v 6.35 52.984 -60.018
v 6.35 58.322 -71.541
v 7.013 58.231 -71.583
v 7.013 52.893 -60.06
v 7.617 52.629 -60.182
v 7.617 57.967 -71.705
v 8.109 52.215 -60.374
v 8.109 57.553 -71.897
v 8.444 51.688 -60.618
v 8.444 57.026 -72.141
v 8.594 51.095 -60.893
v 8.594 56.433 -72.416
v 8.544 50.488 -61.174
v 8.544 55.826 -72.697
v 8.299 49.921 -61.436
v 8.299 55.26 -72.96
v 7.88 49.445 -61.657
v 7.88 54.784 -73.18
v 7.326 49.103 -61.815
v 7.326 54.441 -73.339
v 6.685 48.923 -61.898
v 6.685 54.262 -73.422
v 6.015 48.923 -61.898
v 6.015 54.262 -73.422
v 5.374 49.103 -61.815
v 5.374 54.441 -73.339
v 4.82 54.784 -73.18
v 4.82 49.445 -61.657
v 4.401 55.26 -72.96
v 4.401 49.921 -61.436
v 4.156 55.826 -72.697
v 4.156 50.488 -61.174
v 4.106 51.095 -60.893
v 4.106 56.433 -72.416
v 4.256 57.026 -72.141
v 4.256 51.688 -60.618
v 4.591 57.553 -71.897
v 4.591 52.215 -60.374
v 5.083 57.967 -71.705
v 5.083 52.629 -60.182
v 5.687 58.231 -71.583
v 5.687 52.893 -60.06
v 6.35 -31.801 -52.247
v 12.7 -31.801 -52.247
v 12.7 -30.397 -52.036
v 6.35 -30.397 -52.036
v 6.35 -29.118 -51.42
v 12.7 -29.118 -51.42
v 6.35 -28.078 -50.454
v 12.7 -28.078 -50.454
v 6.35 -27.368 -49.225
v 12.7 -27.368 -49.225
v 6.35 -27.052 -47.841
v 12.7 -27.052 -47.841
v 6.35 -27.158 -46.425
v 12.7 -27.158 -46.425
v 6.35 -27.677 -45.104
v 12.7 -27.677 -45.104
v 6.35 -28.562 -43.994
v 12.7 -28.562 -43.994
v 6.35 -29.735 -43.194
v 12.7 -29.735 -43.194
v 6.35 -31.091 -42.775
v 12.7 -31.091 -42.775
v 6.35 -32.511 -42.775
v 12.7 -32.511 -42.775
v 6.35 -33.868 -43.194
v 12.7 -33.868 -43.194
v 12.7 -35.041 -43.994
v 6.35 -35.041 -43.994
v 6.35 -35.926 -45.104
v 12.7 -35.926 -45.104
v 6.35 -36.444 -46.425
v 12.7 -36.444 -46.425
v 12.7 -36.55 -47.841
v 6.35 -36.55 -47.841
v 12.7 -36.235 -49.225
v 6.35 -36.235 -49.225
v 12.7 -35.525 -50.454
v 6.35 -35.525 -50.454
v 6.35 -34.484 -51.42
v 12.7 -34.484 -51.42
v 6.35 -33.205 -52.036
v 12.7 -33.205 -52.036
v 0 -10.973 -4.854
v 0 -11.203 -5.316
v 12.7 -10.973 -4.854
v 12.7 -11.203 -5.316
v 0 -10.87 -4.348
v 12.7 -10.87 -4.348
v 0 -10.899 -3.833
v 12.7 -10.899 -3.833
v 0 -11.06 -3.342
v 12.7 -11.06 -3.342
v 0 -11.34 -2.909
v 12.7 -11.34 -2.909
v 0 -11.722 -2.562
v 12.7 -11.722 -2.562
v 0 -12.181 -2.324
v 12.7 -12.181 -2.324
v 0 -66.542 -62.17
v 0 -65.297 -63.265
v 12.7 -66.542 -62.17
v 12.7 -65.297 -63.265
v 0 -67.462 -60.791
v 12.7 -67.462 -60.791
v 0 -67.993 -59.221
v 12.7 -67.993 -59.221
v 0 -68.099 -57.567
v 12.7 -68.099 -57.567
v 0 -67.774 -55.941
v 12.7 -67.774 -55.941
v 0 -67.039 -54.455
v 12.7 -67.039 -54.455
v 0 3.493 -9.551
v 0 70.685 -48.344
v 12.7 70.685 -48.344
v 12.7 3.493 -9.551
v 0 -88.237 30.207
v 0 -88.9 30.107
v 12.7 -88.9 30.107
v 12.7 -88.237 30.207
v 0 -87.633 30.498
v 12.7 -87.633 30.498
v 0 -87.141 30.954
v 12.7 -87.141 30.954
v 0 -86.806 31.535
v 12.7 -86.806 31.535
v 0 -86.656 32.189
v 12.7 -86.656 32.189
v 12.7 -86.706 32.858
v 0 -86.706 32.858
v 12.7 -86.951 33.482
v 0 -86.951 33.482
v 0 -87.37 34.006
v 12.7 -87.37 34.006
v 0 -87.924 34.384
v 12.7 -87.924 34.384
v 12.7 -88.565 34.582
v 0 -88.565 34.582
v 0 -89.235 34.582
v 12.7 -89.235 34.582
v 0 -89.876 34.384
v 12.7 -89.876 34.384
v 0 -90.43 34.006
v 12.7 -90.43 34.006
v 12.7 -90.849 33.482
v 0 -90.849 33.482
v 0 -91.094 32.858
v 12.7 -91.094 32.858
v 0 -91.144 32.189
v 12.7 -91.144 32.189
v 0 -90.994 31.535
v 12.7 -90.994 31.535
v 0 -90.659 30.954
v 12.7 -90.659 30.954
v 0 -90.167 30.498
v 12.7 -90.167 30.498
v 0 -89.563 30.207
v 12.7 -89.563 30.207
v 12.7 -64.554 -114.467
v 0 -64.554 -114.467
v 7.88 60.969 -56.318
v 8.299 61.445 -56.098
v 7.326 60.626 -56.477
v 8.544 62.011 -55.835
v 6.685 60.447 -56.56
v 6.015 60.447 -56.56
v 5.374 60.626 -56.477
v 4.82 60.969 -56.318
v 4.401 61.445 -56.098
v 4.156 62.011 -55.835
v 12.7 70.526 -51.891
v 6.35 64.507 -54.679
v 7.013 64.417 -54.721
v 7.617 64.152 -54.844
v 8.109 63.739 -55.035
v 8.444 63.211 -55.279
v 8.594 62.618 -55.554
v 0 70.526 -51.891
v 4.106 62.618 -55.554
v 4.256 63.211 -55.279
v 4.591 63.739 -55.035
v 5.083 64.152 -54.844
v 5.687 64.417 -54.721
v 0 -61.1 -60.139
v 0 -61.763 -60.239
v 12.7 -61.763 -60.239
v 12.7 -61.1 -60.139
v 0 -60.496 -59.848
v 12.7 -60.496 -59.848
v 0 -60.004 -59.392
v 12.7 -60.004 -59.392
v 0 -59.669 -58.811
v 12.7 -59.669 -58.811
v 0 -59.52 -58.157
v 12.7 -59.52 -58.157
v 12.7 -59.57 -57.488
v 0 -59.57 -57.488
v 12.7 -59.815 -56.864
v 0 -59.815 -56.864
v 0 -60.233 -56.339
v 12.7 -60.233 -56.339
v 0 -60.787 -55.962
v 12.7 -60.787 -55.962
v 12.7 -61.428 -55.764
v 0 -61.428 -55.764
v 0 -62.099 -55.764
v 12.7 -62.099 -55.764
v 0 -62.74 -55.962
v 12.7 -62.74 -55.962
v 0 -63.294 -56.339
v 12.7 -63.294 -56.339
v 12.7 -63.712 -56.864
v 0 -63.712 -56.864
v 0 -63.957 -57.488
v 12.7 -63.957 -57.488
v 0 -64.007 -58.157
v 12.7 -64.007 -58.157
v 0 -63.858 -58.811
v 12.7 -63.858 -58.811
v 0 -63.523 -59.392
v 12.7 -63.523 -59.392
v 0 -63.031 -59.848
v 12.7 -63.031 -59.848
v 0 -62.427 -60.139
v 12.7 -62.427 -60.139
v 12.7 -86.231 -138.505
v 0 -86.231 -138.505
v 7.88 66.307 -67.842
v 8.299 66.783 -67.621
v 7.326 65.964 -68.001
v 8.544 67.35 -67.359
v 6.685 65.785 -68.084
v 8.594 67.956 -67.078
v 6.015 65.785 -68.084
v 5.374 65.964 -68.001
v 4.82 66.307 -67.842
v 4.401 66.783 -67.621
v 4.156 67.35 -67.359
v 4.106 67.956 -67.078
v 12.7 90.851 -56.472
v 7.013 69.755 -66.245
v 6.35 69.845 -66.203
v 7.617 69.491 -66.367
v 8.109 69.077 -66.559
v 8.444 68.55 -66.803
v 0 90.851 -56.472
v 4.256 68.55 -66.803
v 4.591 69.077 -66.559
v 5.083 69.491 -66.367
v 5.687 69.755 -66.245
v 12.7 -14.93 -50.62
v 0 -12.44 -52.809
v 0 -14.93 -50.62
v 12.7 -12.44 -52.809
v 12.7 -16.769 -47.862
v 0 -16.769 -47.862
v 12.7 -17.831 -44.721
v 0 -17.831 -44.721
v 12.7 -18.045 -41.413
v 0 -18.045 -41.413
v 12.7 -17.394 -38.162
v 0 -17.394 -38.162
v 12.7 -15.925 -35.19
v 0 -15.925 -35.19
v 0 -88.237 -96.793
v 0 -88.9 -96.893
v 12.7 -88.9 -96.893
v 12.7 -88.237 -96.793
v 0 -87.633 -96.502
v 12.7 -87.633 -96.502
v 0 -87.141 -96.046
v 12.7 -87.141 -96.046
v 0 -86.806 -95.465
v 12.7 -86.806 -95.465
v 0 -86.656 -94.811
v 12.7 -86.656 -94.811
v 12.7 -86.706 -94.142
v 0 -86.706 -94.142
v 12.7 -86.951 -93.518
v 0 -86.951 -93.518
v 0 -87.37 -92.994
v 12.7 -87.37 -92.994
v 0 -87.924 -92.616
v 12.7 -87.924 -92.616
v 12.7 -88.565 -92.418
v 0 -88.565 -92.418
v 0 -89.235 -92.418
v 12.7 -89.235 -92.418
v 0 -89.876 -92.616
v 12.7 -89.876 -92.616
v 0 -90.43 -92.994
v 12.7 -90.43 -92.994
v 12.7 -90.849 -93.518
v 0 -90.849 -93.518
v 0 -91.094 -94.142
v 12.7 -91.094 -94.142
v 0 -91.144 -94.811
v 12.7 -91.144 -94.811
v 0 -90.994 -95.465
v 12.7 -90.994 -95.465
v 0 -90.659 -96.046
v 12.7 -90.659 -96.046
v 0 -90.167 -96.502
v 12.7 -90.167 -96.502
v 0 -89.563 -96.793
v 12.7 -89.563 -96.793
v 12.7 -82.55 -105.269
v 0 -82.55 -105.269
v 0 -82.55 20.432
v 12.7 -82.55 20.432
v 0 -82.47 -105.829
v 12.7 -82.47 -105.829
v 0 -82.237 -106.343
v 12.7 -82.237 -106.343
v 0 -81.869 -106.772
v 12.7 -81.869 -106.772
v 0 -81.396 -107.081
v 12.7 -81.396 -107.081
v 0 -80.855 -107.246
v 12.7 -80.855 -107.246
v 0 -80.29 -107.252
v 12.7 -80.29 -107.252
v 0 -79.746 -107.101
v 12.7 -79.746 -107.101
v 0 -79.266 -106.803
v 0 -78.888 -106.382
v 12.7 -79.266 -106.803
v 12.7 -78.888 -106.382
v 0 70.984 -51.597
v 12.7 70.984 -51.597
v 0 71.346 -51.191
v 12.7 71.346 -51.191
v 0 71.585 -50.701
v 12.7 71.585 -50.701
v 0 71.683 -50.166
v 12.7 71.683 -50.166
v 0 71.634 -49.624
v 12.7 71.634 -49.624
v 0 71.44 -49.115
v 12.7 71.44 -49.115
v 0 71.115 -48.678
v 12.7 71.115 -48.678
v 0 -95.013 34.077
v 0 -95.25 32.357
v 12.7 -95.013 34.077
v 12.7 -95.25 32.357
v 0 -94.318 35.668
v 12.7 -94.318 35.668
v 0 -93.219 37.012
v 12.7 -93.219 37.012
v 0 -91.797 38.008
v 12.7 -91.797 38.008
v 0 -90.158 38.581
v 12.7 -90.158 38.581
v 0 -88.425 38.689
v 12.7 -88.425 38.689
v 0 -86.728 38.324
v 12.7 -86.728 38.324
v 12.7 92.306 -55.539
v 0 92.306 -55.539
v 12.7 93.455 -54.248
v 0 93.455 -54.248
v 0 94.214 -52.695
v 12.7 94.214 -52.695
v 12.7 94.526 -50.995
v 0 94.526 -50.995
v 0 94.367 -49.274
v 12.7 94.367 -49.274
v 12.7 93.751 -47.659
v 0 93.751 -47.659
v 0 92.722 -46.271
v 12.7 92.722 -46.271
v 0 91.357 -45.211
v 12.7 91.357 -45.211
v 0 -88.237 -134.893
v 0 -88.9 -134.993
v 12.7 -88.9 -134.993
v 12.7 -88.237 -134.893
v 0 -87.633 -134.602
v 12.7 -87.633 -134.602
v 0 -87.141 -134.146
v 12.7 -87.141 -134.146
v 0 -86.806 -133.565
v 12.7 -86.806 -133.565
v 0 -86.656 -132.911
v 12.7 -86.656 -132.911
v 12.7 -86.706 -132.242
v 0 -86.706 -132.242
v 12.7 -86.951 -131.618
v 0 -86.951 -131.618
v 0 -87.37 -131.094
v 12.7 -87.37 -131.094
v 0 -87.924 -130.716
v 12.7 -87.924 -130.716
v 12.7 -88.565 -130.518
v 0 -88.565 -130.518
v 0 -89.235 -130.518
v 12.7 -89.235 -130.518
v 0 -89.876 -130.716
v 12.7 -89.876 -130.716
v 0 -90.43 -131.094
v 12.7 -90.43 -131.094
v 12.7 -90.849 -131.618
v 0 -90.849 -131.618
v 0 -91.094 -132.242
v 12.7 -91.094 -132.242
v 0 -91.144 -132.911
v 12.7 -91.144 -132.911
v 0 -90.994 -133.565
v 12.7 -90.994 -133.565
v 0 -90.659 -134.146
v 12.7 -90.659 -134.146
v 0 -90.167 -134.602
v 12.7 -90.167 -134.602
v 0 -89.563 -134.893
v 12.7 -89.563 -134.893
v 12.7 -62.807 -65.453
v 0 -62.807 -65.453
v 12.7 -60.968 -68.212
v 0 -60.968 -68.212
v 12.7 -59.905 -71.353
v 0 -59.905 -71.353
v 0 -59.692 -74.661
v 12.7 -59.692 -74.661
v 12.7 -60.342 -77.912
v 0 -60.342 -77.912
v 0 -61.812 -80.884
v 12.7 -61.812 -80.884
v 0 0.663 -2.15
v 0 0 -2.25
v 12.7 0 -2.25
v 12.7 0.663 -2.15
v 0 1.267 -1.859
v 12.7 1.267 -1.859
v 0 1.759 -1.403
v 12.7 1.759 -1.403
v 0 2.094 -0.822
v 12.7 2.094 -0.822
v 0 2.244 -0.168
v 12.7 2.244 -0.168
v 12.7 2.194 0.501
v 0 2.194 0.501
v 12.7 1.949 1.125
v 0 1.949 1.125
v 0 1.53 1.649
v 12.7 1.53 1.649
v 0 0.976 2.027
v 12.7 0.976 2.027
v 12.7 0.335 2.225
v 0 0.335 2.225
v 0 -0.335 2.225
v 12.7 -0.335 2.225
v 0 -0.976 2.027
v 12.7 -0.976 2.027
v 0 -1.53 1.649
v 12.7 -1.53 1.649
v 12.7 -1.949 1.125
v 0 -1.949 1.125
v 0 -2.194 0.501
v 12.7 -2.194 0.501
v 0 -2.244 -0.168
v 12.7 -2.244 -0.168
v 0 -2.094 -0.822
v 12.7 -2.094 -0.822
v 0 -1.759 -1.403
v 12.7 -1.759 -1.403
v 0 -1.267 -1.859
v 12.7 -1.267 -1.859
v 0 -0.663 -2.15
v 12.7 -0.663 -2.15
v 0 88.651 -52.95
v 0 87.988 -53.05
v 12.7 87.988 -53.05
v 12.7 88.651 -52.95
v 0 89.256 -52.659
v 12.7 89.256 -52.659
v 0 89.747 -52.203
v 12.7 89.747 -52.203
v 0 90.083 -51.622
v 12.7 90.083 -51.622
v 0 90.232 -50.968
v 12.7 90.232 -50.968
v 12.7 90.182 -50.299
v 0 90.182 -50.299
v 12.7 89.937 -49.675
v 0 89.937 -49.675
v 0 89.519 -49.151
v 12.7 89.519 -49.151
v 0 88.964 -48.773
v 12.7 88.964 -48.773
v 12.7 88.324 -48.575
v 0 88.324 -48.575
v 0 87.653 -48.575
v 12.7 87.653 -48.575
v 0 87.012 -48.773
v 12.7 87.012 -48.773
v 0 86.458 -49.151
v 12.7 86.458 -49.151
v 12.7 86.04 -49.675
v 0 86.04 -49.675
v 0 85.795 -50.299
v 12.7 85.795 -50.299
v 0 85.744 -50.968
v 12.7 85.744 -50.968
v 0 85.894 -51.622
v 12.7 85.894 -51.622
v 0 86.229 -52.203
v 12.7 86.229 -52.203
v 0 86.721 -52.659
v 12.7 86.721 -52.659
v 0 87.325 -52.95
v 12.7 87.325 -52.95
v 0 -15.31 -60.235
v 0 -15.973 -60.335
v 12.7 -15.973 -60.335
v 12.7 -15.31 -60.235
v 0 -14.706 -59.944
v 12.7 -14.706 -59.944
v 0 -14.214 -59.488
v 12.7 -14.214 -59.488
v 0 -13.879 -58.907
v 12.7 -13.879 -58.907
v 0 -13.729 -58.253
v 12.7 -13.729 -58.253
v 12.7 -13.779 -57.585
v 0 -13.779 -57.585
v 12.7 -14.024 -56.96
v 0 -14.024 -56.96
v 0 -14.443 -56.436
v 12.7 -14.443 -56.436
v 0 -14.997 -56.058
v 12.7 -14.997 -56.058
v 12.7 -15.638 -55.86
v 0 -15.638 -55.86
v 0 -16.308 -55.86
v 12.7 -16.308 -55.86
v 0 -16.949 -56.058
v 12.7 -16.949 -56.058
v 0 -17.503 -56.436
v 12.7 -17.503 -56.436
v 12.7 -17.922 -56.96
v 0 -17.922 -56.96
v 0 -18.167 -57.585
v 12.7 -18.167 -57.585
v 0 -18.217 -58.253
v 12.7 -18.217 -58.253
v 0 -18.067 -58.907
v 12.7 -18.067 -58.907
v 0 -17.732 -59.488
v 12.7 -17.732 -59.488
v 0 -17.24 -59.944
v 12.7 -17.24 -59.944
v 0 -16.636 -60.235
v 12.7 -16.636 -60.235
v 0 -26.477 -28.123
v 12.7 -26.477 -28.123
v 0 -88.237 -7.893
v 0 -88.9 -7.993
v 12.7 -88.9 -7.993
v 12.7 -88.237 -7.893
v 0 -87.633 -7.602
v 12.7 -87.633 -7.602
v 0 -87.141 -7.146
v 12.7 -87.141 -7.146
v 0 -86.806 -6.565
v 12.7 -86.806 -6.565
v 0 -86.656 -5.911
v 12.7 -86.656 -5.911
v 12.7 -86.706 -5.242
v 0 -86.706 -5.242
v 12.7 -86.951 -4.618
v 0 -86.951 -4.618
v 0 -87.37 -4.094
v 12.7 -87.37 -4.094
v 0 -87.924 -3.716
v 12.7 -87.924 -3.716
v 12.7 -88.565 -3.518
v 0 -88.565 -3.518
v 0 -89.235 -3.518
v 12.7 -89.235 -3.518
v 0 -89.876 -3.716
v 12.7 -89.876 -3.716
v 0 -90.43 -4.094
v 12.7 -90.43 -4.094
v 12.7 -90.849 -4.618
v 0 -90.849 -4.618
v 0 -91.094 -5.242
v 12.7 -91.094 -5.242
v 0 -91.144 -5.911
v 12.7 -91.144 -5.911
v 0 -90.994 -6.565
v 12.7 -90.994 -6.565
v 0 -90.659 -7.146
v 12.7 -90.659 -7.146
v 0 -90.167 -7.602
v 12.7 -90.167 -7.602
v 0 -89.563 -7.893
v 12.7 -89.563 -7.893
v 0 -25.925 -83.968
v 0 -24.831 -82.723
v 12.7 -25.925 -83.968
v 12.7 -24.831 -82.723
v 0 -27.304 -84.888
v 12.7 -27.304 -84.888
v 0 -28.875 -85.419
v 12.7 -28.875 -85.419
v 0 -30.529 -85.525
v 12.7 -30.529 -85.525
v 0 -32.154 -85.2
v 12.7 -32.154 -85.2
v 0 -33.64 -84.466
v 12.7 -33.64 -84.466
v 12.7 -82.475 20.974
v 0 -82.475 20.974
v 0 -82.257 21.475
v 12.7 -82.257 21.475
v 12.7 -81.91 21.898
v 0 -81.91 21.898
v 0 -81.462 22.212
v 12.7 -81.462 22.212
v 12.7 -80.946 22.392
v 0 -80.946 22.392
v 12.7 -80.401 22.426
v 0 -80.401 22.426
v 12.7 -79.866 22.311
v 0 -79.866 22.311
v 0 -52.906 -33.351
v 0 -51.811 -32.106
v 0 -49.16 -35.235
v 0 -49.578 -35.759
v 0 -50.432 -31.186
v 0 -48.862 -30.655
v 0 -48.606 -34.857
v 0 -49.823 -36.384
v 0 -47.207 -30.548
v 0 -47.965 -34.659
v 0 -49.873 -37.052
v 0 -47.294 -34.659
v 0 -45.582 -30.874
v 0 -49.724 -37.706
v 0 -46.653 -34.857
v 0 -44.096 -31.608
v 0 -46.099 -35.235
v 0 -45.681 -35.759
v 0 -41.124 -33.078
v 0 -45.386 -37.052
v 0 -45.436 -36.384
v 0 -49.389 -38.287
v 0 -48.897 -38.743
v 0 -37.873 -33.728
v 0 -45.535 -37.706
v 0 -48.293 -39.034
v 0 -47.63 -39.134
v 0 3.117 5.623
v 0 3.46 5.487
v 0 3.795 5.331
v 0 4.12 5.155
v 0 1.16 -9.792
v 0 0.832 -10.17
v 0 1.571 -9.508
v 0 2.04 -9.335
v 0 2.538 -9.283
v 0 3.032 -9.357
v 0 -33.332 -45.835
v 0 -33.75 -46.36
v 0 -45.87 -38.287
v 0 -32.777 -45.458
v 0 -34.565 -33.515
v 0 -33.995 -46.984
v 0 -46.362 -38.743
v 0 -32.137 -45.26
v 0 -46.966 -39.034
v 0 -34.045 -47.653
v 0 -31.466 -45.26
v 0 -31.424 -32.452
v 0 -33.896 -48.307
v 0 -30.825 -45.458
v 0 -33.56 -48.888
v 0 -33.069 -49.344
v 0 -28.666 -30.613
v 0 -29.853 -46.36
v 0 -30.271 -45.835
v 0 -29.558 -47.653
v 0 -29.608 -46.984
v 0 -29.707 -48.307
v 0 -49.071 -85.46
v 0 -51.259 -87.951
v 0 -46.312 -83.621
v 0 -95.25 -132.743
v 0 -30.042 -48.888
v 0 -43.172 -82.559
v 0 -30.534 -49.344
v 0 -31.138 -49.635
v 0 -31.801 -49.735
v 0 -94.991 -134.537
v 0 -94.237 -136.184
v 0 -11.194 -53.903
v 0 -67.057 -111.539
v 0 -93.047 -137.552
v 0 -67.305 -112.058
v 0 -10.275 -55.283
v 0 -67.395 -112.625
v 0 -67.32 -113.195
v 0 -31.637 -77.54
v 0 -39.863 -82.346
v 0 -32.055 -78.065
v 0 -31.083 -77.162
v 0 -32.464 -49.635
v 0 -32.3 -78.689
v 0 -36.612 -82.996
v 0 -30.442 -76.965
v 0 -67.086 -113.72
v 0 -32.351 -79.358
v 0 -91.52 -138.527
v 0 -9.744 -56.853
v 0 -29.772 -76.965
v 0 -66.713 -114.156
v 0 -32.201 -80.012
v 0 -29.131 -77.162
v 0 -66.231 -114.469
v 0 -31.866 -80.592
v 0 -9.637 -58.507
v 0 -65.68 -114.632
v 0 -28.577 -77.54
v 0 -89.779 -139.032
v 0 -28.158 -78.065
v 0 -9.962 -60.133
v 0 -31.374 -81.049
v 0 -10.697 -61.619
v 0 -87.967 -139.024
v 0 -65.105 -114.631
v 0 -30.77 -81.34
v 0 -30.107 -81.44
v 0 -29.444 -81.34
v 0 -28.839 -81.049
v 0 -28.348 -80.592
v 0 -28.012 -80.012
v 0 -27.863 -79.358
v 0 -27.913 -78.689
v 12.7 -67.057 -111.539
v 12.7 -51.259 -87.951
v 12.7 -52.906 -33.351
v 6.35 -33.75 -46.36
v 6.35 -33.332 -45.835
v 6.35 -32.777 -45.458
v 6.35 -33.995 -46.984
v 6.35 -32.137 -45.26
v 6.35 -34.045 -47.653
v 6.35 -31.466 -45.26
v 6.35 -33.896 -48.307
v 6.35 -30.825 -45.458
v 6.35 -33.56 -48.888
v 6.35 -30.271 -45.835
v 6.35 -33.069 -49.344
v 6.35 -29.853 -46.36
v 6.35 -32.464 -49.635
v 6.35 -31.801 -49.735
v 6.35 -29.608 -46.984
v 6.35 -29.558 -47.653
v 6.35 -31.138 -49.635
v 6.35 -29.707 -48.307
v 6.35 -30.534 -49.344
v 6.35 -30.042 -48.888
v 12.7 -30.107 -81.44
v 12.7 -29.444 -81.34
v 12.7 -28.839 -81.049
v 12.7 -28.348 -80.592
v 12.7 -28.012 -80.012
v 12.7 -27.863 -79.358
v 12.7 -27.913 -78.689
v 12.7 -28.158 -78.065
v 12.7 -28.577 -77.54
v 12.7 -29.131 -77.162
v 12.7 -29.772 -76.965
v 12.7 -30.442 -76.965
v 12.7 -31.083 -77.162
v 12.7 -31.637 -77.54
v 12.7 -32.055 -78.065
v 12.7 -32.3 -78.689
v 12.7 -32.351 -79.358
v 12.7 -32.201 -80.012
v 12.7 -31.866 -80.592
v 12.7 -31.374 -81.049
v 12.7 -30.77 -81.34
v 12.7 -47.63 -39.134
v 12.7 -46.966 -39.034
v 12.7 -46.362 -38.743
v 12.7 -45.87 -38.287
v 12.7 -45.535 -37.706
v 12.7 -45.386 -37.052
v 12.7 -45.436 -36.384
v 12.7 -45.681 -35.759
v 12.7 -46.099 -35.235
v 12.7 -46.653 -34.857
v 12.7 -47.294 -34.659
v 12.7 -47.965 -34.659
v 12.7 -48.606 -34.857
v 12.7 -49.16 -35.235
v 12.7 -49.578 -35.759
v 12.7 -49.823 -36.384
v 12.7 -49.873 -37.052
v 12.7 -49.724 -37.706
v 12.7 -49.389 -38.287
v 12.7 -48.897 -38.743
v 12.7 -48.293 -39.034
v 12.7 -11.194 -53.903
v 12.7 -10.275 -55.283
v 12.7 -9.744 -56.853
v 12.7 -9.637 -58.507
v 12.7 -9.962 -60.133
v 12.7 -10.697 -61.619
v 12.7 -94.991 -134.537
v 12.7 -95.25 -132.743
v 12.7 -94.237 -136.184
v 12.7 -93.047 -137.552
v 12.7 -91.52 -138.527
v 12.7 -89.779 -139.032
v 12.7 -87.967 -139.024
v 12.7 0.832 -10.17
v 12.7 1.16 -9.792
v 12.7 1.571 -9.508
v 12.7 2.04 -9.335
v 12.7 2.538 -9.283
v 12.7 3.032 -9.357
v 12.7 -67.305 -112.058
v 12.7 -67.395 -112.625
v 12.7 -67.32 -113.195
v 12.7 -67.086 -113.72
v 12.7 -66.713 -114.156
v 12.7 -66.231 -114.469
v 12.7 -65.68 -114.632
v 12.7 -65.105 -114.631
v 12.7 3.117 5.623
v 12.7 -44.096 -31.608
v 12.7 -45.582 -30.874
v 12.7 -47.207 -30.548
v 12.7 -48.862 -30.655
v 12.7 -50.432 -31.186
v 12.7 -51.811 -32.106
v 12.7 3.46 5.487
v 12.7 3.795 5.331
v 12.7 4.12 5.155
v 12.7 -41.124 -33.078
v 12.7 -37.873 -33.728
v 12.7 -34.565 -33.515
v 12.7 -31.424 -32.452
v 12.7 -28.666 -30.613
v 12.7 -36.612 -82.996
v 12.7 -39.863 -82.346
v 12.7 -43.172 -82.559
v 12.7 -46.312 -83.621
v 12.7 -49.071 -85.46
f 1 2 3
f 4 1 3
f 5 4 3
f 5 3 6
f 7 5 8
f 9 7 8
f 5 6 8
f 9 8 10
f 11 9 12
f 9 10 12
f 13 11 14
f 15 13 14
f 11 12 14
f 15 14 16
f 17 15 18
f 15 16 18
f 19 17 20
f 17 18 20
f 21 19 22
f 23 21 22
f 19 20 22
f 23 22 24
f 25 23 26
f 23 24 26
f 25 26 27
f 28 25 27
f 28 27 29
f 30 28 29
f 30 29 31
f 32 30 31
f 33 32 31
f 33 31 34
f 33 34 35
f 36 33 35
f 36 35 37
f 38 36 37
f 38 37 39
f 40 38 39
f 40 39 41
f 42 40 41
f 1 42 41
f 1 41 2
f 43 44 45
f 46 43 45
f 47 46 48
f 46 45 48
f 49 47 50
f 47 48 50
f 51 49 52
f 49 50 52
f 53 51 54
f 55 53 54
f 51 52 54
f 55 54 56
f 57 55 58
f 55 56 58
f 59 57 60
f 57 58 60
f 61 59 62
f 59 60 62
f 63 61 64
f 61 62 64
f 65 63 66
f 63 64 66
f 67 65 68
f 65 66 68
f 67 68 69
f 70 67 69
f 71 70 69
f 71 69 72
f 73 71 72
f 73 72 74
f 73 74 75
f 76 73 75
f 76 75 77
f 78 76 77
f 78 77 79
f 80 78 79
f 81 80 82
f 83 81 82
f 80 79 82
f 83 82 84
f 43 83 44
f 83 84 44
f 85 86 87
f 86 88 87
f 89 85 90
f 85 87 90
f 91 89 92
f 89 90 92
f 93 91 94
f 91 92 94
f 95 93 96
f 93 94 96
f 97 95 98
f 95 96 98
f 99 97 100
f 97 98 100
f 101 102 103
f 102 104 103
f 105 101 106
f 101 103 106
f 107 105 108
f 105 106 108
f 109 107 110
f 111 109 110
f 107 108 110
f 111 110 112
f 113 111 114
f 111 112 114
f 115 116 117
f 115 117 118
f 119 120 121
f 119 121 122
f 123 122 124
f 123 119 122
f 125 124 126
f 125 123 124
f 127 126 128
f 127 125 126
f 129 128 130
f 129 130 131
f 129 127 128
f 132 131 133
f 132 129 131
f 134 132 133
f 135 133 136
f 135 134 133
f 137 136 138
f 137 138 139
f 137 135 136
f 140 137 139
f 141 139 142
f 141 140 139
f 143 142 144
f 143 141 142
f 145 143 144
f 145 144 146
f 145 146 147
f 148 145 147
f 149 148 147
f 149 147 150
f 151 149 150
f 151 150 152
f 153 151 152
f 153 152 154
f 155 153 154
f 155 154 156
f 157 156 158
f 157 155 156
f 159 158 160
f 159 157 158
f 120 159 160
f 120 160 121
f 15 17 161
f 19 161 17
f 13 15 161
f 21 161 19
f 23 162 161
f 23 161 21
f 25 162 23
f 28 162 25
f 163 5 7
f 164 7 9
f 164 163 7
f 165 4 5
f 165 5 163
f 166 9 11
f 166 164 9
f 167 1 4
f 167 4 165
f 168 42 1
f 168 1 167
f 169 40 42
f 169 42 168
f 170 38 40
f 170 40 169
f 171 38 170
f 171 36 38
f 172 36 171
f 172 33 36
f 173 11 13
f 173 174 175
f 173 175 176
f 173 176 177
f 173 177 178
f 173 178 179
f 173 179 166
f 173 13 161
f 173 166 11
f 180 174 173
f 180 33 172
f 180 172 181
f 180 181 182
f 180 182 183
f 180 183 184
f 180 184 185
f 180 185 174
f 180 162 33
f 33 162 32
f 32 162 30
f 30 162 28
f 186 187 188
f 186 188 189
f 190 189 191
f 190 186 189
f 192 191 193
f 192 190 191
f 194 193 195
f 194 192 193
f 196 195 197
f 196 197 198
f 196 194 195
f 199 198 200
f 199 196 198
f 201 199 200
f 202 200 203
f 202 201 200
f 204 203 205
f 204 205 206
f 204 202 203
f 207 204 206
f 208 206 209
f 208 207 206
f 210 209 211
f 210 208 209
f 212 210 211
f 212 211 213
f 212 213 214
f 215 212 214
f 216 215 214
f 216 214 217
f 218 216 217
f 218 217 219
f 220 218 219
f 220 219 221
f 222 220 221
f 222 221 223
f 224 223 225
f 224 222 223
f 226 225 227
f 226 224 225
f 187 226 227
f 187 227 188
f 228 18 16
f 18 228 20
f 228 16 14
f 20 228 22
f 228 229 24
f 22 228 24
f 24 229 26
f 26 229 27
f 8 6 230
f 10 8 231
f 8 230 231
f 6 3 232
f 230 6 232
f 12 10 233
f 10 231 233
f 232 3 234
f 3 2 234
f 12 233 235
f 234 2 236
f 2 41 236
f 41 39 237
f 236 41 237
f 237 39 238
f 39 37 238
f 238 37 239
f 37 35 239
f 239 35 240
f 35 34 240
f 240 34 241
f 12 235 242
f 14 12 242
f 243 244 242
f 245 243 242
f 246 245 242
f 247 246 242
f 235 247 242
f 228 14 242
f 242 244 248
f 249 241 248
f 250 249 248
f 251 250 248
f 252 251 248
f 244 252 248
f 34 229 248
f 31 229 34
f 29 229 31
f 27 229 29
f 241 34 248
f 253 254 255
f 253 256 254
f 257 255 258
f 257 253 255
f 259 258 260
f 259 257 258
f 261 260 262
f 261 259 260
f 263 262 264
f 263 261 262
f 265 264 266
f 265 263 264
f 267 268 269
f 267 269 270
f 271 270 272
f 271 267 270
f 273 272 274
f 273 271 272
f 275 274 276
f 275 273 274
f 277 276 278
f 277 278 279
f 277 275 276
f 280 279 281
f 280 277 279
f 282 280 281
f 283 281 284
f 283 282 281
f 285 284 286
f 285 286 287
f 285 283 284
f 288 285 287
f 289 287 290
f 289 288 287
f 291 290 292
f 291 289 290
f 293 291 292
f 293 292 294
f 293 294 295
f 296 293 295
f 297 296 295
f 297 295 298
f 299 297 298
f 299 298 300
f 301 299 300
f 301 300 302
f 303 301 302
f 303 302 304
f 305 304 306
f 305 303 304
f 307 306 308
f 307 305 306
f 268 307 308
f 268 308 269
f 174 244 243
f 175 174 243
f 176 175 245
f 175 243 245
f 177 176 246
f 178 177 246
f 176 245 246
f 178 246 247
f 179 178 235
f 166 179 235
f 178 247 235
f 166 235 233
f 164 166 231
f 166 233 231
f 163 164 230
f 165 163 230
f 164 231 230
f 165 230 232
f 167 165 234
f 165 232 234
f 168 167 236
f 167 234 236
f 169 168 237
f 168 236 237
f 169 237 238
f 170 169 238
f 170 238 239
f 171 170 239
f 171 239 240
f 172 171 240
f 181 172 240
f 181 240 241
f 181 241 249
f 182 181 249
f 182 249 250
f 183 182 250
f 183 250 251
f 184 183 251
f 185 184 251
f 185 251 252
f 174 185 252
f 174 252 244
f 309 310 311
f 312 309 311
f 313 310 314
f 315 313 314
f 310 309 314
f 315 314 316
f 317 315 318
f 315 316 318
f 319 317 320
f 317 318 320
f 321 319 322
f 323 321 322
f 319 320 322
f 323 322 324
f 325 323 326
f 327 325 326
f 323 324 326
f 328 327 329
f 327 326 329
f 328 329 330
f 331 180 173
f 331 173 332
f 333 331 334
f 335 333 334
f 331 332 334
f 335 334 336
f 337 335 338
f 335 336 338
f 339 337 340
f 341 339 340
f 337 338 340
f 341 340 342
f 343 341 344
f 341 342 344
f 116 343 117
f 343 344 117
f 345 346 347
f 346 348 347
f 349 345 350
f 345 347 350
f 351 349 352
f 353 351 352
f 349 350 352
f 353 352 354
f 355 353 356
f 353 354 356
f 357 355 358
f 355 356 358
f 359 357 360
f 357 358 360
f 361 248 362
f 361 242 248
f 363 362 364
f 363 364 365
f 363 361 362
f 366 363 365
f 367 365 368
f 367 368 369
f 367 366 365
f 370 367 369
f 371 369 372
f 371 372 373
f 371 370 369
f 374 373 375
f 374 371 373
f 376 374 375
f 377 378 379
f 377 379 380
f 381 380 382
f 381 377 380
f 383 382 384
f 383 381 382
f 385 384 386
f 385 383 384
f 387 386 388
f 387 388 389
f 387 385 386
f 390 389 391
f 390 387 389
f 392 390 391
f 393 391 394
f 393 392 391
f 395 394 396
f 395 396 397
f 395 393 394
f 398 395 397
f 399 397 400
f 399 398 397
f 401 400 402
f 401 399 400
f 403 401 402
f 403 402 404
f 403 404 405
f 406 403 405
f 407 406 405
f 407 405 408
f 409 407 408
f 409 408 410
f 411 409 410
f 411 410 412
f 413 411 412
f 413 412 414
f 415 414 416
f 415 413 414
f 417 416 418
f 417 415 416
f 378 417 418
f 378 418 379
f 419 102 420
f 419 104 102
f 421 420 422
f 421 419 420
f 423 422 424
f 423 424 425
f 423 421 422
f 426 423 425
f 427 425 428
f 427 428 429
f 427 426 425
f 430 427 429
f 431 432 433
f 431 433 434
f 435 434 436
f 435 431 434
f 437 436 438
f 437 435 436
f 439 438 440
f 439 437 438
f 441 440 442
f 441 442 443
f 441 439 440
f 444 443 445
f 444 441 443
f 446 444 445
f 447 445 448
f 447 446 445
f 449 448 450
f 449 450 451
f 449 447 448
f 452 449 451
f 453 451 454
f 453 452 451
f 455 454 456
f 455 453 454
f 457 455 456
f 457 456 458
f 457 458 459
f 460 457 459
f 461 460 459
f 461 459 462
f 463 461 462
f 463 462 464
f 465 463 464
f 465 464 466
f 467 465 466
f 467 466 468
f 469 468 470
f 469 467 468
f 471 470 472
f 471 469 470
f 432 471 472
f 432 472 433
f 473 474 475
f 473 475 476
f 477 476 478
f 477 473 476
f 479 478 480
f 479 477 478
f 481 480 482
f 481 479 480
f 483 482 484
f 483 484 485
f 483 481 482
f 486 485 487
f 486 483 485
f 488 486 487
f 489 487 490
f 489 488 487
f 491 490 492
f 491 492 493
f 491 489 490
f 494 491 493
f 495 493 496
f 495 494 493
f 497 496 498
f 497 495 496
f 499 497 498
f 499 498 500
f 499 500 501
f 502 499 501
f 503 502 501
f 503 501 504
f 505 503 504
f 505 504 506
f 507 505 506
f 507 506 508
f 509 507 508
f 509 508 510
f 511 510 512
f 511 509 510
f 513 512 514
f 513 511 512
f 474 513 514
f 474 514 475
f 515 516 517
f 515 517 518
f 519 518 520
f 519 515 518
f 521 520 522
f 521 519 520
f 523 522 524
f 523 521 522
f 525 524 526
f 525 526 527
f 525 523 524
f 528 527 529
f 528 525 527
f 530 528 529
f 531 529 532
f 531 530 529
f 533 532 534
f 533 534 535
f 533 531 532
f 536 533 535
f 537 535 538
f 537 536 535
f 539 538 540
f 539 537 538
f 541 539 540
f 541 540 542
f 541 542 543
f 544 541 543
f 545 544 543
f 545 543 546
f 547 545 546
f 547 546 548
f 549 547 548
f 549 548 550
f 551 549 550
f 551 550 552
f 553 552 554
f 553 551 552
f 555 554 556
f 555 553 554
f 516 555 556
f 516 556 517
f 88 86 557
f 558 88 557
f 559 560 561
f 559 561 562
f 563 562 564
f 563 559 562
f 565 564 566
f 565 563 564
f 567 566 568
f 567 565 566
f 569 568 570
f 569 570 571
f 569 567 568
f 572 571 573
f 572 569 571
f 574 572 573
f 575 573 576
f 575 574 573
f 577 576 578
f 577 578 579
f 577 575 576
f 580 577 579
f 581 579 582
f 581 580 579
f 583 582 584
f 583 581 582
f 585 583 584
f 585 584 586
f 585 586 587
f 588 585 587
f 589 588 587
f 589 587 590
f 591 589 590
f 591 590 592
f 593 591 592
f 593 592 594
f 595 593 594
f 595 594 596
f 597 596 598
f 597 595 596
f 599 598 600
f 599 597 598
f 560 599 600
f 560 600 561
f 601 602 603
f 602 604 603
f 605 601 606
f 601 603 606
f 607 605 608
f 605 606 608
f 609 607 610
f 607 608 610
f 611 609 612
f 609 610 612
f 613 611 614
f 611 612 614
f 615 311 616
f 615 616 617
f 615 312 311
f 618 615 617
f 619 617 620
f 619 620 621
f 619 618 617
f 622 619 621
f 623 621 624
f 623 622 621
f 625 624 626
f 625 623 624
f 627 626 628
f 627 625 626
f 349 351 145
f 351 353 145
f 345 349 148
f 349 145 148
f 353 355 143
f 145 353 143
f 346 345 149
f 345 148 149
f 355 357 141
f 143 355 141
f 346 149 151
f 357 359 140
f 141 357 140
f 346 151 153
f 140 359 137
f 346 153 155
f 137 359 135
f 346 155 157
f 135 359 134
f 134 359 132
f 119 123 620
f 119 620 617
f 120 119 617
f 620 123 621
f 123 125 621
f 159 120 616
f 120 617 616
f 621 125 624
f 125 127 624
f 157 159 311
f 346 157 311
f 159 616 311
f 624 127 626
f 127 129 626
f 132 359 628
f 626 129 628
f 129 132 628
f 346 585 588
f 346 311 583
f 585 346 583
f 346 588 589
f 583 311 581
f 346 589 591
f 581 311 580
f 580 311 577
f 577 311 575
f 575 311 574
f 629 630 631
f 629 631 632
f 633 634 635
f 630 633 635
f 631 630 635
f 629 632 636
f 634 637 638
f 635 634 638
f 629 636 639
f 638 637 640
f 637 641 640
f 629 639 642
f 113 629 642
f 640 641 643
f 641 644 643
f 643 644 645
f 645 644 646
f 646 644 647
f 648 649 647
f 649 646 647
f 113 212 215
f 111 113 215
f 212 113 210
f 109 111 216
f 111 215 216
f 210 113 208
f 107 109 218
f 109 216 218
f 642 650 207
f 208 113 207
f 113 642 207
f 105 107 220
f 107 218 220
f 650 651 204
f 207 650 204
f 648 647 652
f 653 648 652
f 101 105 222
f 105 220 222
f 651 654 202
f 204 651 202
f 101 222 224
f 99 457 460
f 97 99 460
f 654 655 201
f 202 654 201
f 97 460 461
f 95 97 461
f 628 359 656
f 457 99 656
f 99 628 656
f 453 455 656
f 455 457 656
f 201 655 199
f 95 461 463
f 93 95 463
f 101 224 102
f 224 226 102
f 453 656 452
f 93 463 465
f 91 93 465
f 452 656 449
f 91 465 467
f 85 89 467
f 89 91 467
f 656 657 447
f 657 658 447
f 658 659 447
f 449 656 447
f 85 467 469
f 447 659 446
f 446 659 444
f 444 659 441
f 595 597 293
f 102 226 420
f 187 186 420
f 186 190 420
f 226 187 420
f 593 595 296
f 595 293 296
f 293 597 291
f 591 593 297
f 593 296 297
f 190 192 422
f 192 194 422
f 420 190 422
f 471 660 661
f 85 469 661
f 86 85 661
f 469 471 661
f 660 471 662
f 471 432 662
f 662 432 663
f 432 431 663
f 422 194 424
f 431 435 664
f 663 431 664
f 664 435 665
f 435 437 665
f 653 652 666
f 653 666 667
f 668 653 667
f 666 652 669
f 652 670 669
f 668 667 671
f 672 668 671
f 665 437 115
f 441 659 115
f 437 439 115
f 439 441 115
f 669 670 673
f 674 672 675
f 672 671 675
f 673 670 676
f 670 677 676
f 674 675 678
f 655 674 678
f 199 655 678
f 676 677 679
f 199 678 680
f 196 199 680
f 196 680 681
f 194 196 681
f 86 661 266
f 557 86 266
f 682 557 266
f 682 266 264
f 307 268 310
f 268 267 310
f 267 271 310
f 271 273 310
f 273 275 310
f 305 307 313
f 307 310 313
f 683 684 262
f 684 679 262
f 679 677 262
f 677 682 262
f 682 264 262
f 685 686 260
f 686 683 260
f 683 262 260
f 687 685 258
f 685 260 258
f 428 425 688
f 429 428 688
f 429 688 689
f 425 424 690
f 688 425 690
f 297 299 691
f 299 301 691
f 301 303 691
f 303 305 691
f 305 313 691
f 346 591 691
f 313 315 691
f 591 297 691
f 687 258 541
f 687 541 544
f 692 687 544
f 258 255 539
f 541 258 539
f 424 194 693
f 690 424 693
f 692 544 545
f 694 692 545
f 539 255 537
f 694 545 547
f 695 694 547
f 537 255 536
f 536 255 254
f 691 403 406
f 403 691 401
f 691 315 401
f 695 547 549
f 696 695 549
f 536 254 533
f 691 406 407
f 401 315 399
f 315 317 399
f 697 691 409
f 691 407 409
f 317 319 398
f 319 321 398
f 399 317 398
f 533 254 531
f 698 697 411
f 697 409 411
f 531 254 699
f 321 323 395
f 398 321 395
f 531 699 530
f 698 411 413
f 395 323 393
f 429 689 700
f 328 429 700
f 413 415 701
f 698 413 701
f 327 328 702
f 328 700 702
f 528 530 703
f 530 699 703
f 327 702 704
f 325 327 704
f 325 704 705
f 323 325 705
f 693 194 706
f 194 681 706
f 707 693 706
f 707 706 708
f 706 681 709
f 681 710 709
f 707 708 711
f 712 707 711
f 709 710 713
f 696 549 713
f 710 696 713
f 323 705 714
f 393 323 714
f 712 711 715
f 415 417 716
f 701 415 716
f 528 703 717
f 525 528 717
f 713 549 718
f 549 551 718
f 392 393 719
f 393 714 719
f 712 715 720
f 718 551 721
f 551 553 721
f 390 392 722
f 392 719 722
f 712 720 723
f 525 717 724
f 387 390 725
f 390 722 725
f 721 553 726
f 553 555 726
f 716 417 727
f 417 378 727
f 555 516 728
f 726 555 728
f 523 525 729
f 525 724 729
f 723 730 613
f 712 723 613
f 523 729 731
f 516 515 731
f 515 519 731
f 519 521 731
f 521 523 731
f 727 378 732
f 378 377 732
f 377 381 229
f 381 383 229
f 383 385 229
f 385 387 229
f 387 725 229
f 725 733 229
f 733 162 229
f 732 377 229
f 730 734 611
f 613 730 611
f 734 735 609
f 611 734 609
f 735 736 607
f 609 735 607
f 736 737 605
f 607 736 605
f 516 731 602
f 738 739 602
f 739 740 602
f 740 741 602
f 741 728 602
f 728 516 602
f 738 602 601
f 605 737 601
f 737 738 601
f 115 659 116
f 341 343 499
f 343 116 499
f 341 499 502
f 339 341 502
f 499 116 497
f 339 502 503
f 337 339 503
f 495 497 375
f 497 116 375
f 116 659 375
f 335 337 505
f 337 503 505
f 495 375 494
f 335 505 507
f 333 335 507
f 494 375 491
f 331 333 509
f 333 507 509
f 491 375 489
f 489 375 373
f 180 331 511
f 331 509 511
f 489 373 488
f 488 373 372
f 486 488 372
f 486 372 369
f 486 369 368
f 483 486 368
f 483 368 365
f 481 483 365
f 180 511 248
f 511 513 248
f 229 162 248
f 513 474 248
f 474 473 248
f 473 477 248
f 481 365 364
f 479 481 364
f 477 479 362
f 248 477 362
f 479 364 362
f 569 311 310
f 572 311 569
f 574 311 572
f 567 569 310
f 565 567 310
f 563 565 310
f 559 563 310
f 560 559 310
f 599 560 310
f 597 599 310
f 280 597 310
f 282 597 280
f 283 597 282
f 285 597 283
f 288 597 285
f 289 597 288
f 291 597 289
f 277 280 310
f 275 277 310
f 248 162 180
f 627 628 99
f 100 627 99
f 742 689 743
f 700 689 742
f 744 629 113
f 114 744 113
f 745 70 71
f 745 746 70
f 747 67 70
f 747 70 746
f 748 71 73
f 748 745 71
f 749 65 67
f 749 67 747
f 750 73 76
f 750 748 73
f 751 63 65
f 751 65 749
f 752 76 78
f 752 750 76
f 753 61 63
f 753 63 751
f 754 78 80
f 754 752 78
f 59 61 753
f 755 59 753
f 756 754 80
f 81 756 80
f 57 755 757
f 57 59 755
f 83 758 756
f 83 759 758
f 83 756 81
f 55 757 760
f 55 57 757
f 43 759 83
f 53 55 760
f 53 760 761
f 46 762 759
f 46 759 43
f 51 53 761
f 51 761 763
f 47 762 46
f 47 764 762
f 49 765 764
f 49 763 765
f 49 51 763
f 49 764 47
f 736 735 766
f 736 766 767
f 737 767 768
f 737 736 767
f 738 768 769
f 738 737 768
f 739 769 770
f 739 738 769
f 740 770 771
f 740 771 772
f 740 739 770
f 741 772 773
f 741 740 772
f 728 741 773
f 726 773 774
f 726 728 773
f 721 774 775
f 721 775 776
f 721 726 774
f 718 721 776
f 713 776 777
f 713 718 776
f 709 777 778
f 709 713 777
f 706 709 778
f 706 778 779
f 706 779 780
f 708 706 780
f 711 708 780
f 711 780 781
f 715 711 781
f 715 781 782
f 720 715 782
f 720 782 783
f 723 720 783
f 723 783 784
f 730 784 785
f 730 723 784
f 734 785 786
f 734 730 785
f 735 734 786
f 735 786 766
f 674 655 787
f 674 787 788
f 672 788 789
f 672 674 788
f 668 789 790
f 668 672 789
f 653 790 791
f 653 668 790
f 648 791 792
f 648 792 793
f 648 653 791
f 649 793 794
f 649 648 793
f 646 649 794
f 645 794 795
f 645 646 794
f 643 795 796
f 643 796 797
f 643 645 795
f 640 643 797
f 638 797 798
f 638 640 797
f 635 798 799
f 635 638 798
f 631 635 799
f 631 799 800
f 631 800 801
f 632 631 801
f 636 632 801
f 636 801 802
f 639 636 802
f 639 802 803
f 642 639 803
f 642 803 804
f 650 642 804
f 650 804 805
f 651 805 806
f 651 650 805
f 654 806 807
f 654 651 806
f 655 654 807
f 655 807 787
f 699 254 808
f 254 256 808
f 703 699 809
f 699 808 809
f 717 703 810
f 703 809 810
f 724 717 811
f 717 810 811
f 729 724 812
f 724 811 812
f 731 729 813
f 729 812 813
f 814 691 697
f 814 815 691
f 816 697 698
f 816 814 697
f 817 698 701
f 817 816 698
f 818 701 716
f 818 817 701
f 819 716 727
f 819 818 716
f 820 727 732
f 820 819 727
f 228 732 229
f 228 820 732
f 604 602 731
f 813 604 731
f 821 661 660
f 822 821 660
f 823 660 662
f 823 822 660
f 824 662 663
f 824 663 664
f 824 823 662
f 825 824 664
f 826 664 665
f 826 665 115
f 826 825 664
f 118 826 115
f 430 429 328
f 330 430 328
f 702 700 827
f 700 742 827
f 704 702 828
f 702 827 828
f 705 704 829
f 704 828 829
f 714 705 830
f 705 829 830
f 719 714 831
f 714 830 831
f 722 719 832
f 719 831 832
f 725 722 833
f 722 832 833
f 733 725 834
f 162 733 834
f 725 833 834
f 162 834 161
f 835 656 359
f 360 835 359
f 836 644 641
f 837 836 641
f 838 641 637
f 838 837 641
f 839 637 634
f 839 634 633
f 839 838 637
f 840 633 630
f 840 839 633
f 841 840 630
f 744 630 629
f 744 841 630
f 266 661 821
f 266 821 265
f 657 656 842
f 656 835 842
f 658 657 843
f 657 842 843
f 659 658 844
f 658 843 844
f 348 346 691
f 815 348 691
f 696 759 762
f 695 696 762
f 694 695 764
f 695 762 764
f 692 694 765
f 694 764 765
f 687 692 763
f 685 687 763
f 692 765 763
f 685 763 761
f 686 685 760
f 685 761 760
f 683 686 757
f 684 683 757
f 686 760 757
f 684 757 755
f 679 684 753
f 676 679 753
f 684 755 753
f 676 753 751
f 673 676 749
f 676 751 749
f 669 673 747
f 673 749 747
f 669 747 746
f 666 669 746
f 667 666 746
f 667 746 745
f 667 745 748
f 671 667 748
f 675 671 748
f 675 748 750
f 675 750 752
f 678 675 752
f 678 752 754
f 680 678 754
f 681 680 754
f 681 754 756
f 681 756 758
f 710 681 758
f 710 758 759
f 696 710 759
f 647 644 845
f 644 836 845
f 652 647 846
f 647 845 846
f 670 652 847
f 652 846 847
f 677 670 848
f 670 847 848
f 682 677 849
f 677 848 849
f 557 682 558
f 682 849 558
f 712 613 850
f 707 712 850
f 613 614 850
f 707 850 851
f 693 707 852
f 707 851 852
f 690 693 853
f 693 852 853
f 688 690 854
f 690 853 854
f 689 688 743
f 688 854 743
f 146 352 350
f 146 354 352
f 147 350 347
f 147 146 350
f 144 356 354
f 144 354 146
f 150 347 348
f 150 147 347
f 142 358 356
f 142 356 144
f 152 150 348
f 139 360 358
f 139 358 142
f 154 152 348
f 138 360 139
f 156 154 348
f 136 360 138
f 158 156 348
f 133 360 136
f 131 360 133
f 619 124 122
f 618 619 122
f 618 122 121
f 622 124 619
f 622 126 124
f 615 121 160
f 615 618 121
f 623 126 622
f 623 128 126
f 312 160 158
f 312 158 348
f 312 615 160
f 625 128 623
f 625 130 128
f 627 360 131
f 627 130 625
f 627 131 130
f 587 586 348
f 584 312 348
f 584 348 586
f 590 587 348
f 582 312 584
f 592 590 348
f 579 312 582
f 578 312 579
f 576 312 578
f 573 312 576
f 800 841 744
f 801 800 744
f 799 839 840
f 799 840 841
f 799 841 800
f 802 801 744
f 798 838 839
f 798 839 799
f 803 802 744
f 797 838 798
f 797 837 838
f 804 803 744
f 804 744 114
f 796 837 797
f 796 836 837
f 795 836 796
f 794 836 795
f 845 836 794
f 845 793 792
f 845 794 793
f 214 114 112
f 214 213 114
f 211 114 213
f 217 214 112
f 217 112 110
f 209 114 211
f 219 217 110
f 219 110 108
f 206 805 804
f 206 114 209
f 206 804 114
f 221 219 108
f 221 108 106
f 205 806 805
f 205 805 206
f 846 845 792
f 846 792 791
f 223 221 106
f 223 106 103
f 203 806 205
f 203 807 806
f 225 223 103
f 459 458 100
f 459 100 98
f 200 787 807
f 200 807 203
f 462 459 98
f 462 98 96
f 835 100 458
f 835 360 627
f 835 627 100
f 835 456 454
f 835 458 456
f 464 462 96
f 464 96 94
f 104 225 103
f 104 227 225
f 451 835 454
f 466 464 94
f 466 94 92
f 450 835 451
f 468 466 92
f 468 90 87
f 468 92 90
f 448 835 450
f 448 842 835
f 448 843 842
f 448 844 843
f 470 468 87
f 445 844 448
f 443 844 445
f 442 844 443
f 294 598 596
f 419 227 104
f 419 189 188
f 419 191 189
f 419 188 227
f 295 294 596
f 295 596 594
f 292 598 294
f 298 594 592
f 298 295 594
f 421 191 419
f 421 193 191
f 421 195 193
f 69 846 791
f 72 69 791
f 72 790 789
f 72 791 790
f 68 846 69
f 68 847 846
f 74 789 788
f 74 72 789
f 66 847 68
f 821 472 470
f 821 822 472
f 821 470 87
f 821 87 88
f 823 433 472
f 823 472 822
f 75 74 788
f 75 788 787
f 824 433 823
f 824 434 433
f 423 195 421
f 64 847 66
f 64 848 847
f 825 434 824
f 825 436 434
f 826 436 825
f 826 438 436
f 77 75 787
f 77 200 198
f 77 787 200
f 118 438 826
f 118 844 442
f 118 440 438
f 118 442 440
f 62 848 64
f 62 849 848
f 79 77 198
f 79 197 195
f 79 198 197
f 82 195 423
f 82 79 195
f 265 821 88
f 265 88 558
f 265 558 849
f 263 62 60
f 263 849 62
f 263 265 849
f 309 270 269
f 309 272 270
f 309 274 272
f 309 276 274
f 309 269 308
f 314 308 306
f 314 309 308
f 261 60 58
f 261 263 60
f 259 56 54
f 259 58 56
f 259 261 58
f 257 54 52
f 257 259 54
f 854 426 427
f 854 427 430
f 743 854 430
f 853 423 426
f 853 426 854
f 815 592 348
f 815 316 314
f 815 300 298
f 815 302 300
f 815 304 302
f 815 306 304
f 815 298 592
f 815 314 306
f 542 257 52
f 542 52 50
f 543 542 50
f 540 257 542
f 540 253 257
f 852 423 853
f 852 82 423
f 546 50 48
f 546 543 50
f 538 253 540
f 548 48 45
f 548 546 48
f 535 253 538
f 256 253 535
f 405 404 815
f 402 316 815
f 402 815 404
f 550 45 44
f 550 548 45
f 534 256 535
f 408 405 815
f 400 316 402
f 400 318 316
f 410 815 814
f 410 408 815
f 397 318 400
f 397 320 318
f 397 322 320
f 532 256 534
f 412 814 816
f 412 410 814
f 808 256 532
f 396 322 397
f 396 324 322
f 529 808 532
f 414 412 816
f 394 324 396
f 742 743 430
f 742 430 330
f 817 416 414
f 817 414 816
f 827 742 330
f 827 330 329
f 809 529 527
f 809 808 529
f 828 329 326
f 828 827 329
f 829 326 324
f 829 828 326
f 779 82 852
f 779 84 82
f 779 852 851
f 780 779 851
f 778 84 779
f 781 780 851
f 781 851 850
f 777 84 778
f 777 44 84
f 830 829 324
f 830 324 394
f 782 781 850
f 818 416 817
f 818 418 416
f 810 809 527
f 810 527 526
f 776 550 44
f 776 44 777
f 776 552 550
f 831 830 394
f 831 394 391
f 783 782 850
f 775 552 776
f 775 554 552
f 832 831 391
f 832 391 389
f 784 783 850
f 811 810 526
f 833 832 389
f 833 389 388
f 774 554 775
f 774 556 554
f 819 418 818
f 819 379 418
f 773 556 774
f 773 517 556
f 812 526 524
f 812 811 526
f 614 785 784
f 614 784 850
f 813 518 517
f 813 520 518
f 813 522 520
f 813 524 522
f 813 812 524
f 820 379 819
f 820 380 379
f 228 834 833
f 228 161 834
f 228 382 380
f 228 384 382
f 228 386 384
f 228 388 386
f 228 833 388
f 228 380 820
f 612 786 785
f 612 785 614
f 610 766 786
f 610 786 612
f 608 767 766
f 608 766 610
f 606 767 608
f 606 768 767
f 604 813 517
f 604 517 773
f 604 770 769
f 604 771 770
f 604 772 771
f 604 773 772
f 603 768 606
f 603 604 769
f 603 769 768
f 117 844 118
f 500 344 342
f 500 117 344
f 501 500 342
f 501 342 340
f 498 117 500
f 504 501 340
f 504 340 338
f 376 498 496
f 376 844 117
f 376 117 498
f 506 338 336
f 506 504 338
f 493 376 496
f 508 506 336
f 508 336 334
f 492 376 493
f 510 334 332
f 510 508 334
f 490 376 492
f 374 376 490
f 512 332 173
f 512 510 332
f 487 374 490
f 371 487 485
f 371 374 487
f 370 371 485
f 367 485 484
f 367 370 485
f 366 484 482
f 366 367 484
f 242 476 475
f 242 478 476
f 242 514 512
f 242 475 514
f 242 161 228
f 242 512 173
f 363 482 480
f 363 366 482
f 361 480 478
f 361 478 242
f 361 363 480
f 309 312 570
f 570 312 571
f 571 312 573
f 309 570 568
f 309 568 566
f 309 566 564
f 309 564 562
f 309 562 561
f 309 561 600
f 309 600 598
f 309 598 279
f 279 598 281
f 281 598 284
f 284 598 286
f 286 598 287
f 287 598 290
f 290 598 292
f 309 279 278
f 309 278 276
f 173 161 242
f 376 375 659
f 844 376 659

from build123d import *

# Parameters (mm, degrees)
SKETCH2_R           = 2.25
BOSS_EXTRUDE1_DEPTH = 12.7
FILLET1_R           = 6.35
FILLET2_R           = 2
CUT_EXTRUDE2_START  = 12.7
SKETCH3_R           = 4.7625
SKETCH3_R_2         = 2.25
CUT_EXTRUDE2_DEPTH  = 6.35
SKETCH3_3_R         = 2.25
BOSS_EXTRUDE2_DEPTH = 12.7
FILLET3_R           = 6.35
CUT_EXTRUDE3_REACH  = 181.366
SKETCH4_R           = 2.25
CUT_EXTRUDE4_START  = 12.7
SKETCH3_4_R         = 2.25
CUT_EXTRUDE4_DEPTH  = 182.75835677
FILLET4_R           = 12.7


with BuildPart() as part:
    # Sketch2 → Boss-Extrude1 (new body)
    with BuildSketch(Plane(origin=(0, 0, 0), x_dir=(0, 0, -1), z_dir=(1, 0, 0))):
        Polygon((-41.425693669, -95.25), (142.682929389, -95.25), (51.328891162, 101.953428549), (-5.433161507, 3.638669384), align=None)
        Circle(SKETCH2_R, mode=Mode.SUBTRACT)
        with Locations((50.8, 87.988181024)):
            Circle(SKETCH2_R, mode=Mode.SUBTRACT)
        with Locations((-32.356953826, -88.9)):
            Circle(SKETCH2_R, mode=Mode.SUBTRACT)
        with Locations((132.743046174, -88.9)):
            Circle(SKETCH2_R, mode=Mode.SUBTRACT)
        with Locations((5.743046174, -88.9)):
            Circle(SKETCH2_R, mode=Mode.SUBTRACT)
        with Locations((94.643046174, -88.9)):
            Circle(SKETCH2_R, mode=Mode.SUBTRACT)
        Polygon((-23.288213983, -82.55), (3.196675109, -9.783365262), (111.849821959, -82.55), align=None, mode=Mode.SUBTRACT)
        Polygon((8.615197161, 1.87277804), (117.46426423, -71.025067394), (50.271108838, 74.0229335), align=None, mode=Mode.SUBTRACT)
    extrude(amount=BOSS_EXTRUDE1_DEPTH)

    # Fillet1
    fillet1_edges = [part.edges().sort_by_distance(p)[0] for p in [
        (6.35, 3.638669384, 5.433161507),
        (6.35, 101.953428549, -51.328891162),
        (6.35, -95.25, -142.682929389),
        (6.35, -95.25, 41.425693669),
    ]]
    fillet(fillet1_edges, radius=FILLET1_R)

    # Fillet2
    fillet2_edges = [part.edges().sort_by_distance(p)[0] for p in [
        (6.35, -82.55, 23.288213983),
        (6.35, -82.55, -111.849821959),
        (6.35, -9.783365262, -3.196675109),
        (6.35, 74.0229335, -50.271108838),
        (6.35, 1.87277804, -8.615197161),
        (6.35, -71.025067394, -117.46426423),
    ]]
    fillet(fillet2_edges, radius=FILLET2_R)

    # Sketch3 → Cut-Extrude2 (cut)
    with BuildSketch(Plane(origin=(0, 0, 0), x_dir=(0, 0, -1), z_dir=(1, 0, 0)).offset(CUT_EXTRUDE2_START)):
        with Locations((47.484762838, -31.801254664)):
            Circle(SKETCH3_R)
        with Locations((47.484762838, -31.801254664)):
            Circle(SKETCH3_R_2, mode=Mode.SUBTRACT)
    extrude(amount=-CUT_EXTRUDE2_DEPTH, mode=Mode.SUBTRACT)

    # Sketch3<3> → Boss-Extrude2 (add)
    # profile 1 of 2: a face of its own
    with BuildSketch(Plane(origin=(0, 0, 0), x_dir=(0, 0, -1), z_dir=(1, 0, 0))):
        Polygon((56.34256904, -7.163442885), (45.742150819, -22.991697164), (77.398659377, -44.192533607), (87.999077599, -28.364279328), align=None)
        with Locations((79.189520098, -30.106891347)):
            Circle(SKETCH3_3_R, mode=Mode.SUBTRACT)
        with Locations((58.085181059, -15.973000385)):
            Circle(SKETCH3_3_R, mode=Mode.SUBTRACT)
    # profile 2 of 2: a face of its own
    with BuildSketch(Plane(origin=(0, 0, 0), x_dir=(0, 0, -1), z_dir=(1, 0, 0))):
        Polygon((59.731295675, -70.572957406), (70.331713896, -54.744703127), (38.675205338, -33.543866684), (28.074787116, -49.372120963), align=None)
        with Locations((57.988683656, -61.763399906)):
            Circle(SKETCH3_3_R, mode=Mode.SUBTRACT)
        with Locations((36.884344616, -47.629508944)):
            Circle(SKETCH3_3_R, mode=Mode.SUBTRACT)
    extrude(amount=BOSS_EXTRUDE2_DEPTH)

    # Fillet3
    fillet3_edges = [part.edges().sort_by_distance(p)[0] for p in [
        (6.35, -28.364279328, -87.999077599),
        (6.35, -7.163442885, -56.34256904),
        (6.35, -49.372120963, -28.074787116),
        (6.35, -70.572957406, -59.731295675),
    ]]
    fillet(fillet3_edges, radius=FILLET3_R)

    # Sketch4 → Cut-Extrude3 (cut, up to next)
    with BuildSketch(Plane(origin=(0, 37.590233469, -81.144994396), x_dir=(-1, 0, 0), z_dir=(0, 0.4203363295122345, -0.9073683761803595)), mode=Mode.PRIVATE) as cut_extrude3_sk1:
        with Locations(Location((-6.35, 20.598120023, 0), (0, 0, 90))):
            Circle(SKETCH4_R)
    cut_extrude3_tool1 = extrude(cut_extrude3_sk1.sketch, amount=-CUT_EXTRUDE3_REACH, mode=Mode.PRIVATE) & part.part
    # Sketch4 → Cut-Extrude3 (cut, up to next)
    with BuildSketch(Plane(origin=(0, 37.590233469, -81.144994396), x_dir=(-1, 0, 0), z_dir=(0, 0.4203363295122345, -0.9073683761803595)), mode=Mode.PRIVATE) as cut_extrude3_sk2:
        with Locations(Location((-6.35, 33.298120023, 0), (0, 0, 90))):
            Circle(SKETCH4_R)
    cut_extrude3_tool2 = extrude(cut_extrude3_sk2.sketch, amount=-CUT_EXTRUDE3_REACH, mode=Mode.PRIVATE) & part.part
    add(cut_extrude3_tool1.solids().sort_by_distance((6.35, 56.280316, -72.486856))[0], mode=Mode.SUBTRACT)
    add(cut_extrude3_tool2.solids().sort_by_distance((6.35, 67.803895, -67.148585))[0], mode=Mode.SUBTRACT)

    # Sketch3<4> → Cut-Extrude4 (cut, through all)
    with BuildSketch(Plane(origin=(0, 0, 0), x_dir=(0, 0, -1), z_dir=(1, 0, 0)).offset(CUT_EXTRUDE4_START)):
        with Locations((47.484762838, -31.801254664)):
            Circle(SKETCH3_4_R)
    extrude(amount=-CUT_EXTRUDE4_DEPTH, mode=Mode.SUBTRACT)

    # Fillet4
    fillet4_edges = [part.edges().sort_by_distance(p)[0] for p in [
        (6.35, -44.192533607, -77.398659377),
        (6.35, -54.744703127, -70.331713896),
        (6.35, -22.991697164, -45.742150819),
        (6.35, -33.543866684, -38.675205338),
    ]]
    fillet(fillet4_edges, radius=FILLET4_R - 0.0001)  # a hair under: the kernel refuses the full size


solid = part.part
